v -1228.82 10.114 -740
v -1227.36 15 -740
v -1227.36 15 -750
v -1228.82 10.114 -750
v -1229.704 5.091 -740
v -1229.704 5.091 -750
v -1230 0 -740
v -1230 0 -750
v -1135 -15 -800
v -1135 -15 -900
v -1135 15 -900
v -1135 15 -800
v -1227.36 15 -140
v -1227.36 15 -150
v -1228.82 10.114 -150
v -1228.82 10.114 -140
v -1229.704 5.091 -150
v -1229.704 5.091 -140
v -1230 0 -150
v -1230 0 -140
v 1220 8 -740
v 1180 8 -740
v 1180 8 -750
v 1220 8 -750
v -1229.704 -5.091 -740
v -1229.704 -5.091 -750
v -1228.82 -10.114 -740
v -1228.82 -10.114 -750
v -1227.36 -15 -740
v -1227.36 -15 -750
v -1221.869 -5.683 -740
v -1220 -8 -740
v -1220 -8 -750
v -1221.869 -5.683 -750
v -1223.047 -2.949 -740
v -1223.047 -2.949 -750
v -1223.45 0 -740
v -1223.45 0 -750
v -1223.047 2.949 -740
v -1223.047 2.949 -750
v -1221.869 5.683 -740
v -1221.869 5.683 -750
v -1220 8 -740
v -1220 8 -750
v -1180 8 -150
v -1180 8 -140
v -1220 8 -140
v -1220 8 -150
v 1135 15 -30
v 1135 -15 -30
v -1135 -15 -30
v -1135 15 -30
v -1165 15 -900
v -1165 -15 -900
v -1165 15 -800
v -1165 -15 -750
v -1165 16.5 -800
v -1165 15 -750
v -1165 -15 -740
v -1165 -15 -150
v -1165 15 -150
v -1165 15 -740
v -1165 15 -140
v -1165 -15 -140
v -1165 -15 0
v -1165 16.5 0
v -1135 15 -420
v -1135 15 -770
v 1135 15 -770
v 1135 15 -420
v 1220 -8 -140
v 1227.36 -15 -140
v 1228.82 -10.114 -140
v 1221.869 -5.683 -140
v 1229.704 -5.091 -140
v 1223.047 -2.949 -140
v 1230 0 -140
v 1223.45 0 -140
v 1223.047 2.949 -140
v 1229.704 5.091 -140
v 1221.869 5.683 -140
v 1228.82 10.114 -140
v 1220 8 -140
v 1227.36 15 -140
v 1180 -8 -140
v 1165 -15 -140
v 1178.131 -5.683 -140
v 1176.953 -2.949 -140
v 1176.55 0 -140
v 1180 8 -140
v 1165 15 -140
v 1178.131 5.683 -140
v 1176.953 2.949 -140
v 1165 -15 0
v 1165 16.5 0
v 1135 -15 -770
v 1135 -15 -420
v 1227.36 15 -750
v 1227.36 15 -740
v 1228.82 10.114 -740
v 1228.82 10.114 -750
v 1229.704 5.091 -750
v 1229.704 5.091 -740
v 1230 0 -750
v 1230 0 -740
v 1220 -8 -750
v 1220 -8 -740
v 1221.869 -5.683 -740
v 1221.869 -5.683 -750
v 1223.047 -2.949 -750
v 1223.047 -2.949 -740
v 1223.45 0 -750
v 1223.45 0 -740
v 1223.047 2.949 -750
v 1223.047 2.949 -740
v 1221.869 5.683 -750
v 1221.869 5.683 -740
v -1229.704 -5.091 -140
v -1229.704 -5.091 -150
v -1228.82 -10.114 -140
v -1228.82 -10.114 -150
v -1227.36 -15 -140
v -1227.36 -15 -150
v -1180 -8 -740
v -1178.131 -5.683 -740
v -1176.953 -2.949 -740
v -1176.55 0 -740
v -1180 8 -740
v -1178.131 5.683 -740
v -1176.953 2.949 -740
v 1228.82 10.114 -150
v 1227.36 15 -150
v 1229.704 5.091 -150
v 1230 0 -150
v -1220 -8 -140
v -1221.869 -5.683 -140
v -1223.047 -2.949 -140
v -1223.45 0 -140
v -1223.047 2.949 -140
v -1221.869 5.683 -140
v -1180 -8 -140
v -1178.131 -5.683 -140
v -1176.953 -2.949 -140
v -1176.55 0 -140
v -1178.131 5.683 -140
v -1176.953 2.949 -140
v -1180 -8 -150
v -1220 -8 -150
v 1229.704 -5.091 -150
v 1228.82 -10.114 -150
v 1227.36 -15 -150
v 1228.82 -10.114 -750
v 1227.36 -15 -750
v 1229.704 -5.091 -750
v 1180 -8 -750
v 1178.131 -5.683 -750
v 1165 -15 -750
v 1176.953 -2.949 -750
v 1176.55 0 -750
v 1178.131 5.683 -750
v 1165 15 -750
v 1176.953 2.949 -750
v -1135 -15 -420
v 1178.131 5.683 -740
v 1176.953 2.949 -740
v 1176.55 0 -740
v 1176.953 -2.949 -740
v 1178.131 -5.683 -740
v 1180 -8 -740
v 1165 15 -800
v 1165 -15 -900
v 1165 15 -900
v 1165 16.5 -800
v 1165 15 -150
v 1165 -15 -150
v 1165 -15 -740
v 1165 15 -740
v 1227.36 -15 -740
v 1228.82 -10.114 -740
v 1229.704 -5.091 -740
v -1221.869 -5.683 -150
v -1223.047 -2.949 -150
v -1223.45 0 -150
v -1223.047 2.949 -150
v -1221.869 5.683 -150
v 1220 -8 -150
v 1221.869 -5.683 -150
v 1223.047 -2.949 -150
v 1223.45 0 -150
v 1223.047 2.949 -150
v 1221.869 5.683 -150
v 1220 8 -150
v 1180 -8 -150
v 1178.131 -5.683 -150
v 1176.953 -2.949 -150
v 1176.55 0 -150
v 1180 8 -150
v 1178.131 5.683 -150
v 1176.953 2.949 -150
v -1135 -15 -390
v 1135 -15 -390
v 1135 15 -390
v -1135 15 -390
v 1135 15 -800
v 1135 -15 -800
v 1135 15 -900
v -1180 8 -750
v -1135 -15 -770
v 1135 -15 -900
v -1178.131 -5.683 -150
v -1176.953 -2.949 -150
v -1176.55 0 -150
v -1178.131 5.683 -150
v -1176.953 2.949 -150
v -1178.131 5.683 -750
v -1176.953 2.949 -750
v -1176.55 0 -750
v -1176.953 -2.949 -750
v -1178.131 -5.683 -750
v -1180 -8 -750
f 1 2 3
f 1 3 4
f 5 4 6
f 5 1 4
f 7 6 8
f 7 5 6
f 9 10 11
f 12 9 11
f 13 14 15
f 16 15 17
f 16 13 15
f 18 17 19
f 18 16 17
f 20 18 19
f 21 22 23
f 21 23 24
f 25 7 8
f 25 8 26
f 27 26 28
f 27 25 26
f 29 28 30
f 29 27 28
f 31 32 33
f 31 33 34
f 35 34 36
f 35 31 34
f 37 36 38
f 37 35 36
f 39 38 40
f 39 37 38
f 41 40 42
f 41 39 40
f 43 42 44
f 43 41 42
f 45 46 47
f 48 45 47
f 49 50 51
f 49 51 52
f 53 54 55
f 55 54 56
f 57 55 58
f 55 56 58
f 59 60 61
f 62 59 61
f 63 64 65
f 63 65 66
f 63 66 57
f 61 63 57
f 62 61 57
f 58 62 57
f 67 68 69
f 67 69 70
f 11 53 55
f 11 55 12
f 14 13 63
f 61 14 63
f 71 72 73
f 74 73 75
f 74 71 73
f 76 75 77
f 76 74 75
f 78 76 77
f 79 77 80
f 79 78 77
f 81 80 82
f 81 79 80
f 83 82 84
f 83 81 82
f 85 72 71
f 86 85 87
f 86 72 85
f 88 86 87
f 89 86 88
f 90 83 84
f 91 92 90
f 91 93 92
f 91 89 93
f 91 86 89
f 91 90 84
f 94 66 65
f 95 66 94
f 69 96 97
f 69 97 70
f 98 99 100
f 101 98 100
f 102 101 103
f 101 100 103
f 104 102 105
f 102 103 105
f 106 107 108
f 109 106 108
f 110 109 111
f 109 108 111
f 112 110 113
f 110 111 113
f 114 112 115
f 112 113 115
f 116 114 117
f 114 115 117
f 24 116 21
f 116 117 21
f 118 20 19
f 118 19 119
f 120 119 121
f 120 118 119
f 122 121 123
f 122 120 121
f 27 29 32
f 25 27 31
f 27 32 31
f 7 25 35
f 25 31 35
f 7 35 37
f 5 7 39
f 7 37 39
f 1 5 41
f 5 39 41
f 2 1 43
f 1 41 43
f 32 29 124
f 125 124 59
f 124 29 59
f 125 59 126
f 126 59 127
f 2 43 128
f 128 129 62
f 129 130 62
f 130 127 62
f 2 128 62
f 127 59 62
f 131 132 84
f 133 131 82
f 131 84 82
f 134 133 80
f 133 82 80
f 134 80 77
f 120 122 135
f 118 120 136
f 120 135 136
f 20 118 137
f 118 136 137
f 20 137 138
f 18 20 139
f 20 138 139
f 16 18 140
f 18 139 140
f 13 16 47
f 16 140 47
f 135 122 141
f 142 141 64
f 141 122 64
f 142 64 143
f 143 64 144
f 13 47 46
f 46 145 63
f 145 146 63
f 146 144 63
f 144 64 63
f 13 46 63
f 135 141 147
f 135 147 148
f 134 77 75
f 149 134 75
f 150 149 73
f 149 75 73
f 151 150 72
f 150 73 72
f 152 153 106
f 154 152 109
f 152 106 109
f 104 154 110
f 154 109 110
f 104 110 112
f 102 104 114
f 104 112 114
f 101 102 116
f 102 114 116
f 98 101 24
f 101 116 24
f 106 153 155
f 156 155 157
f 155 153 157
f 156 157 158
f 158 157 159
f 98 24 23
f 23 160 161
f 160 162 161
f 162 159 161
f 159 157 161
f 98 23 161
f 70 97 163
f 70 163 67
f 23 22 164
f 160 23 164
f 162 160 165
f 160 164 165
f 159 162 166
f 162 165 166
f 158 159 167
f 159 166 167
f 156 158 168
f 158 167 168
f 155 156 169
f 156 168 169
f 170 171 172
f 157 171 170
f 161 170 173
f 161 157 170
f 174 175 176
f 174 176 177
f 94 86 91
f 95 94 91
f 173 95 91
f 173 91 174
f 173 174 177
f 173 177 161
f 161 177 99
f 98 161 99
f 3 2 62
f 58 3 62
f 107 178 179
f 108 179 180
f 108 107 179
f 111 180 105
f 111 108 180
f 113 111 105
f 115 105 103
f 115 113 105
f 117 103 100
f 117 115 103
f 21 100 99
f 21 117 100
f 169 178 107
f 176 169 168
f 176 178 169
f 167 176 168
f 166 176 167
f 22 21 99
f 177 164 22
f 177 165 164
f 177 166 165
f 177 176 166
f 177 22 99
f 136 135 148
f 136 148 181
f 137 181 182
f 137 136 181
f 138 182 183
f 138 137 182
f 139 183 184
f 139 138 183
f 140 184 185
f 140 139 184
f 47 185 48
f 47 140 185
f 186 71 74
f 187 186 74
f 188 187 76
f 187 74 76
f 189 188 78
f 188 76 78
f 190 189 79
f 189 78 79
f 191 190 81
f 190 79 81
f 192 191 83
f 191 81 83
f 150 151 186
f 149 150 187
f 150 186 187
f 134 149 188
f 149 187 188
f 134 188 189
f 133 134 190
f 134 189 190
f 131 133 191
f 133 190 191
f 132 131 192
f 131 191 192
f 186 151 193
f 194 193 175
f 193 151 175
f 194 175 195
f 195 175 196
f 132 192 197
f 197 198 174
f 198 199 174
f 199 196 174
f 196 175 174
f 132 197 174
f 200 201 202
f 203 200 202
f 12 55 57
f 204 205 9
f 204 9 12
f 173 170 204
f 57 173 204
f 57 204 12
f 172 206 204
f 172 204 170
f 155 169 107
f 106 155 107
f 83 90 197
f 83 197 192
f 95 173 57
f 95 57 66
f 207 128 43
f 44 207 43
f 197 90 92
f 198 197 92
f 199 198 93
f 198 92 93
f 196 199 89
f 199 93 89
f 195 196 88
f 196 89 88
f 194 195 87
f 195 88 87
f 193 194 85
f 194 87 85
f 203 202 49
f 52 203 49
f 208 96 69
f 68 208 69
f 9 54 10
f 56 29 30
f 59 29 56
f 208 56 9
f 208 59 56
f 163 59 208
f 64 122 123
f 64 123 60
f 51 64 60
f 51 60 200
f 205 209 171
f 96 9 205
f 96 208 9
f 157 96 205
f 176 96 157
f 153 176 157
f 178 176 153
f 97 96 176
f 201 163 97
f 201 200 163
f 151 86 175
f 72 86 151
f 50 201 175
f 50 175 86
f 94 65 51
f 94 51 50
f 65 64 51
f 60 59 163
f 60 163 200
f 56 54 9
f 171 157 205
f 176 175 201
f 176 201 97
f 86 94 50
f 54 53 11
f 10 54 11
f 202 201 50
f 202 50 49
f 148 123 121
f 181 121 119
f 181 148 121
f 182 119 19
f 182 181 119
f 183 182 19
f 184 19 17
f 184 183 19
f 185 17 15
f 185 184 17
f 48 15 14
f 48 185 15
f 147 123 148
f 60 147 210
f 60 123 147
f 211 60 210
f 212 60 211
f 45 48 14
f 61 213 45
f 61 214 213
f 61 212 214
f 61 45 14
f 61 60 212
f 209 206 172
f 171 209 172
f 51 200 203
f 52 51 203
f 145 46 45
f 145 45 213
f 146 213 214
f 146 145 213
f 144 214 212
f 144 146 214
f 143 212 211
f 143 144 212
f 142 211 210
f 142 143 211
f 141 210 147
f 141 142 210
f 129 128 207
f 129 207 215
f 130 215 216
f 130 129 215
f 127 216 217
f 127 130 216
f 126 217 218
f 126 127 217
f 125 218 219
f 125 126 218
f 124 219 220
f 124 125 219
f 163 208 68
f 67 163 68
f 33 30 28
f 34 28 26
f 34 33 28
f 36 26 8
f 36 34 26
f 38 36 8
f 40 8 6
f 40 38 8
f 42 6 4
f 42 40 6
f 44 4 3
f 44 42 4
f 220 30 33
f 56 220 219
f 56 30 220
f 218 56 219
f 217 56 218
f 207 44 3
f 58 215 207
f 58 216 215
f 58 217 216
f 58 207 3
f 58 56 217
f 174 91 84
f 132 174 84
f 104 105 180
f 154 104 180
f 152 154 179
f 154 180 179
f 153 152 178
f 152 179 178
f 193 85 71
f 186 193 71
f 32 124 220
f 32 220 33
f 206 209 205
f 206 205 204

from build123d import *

# Parameters (mm, degrees)
F0_W      = 30
F0_H      = 30
F1_DEPTH  = 900
F2_W      = 30
F2_H      = 30
F3_DEPTH  = 2300
F4_W      = 30
F4_H      = 10
F5_DEPTH  = 65
F6_W      = 40
F6_H      = 16
F7_DEPTH  = 760.001
F9_W      = 1.5
F9_H      = 800
F10_DEPTH = 2330


with BuildPart() as f1:
    # F0 (on Top) → F1 (new body)
    with BuildSketch(Plane.XY):
        with Locations((-1150, 0)):
            Rectangle(F0_W, F0_H)
        with Locations((1150, 0)):
            Rectangle(F0_W, F0_H)
    extrude(amount=-F1_DEPTH)

    # F2 (on face) → F3 (join, through all)
    with BuildSketch(Plane.YZ.offset(1165)):
        with Locations((0, -15)):
            Rectangle(F2_W, F2_H)
        with Locations((0, -405)):
            Rectangle(F2_W, F2_H)
        with Locations((0, -785)):
            Rectangle(F2_W, F2_H)
    extrude(amount=-F3_DEPTH)

    # F8: F5 across plane


with BuildPart() as f5:
    # F4 (on face) → F5 (new body)
    with BuildSketch(Plane.YZ.offset(1165)):
        with Locations((0, -145)):
            Rectangle(F4_W, F4_H)
        with Locations((0, -745)):
            Rectangle(F4_W, F4_H)
    extrude(amount=F5_DEPTH)

    # F6 (on face) → F7 (cut, through all)
    with BuildSketch(Plane.XY.offset(-140)):
        with BuildLine():
            Line((1230, 15), (1227.360249, 15))
            ThreePointArc((1227.360249, 15), (1229.33503, 7.615252), (1230, 0))
            Line((1230, 0), (1230, 15))
        make_face()
        with BuildLine():
            ThreePointArc((1230, 0), (1229.33503, -7.615253), (1227.360249, -15))
            Line((1227.360249, -15), (1230, -15))
            Line((1230, -15), (1230, 0))
        make_face()
        with Locations((1200, 0)):
            Rectangle(F6_W, F6_H)
        with BuildLine():
            Line((1220, 8), (1220, -8))
            ThreePointArc((1220, -8), (1223.450166, 0), (1220, 8))
        make_face()
        with BuildLine():
            ThreePointArc((1180, 8), (1176.549834, 0), (1180, -8))
            Line((1180, -8), (1180, 8))
        make_face()
    extrude(amount=-F7_DEPTH, mode=Mode.SUBTRACT)


with BuildPart() as f1_1:
    add(f1.part)
    add(f5.part.mirror(Plane.YZ))


    add(f5.part)  # F10 merges F5
    # F9 (on face) → F10 (join, through all)
    with BuildSketch(Plane.YZ.offset(1165)):
        with Locations((15.75, -400)):
            Rectangle(F9_W, F9_H)
    extrude(amount=-F10_DEPTH)


solid = f1_1.part
